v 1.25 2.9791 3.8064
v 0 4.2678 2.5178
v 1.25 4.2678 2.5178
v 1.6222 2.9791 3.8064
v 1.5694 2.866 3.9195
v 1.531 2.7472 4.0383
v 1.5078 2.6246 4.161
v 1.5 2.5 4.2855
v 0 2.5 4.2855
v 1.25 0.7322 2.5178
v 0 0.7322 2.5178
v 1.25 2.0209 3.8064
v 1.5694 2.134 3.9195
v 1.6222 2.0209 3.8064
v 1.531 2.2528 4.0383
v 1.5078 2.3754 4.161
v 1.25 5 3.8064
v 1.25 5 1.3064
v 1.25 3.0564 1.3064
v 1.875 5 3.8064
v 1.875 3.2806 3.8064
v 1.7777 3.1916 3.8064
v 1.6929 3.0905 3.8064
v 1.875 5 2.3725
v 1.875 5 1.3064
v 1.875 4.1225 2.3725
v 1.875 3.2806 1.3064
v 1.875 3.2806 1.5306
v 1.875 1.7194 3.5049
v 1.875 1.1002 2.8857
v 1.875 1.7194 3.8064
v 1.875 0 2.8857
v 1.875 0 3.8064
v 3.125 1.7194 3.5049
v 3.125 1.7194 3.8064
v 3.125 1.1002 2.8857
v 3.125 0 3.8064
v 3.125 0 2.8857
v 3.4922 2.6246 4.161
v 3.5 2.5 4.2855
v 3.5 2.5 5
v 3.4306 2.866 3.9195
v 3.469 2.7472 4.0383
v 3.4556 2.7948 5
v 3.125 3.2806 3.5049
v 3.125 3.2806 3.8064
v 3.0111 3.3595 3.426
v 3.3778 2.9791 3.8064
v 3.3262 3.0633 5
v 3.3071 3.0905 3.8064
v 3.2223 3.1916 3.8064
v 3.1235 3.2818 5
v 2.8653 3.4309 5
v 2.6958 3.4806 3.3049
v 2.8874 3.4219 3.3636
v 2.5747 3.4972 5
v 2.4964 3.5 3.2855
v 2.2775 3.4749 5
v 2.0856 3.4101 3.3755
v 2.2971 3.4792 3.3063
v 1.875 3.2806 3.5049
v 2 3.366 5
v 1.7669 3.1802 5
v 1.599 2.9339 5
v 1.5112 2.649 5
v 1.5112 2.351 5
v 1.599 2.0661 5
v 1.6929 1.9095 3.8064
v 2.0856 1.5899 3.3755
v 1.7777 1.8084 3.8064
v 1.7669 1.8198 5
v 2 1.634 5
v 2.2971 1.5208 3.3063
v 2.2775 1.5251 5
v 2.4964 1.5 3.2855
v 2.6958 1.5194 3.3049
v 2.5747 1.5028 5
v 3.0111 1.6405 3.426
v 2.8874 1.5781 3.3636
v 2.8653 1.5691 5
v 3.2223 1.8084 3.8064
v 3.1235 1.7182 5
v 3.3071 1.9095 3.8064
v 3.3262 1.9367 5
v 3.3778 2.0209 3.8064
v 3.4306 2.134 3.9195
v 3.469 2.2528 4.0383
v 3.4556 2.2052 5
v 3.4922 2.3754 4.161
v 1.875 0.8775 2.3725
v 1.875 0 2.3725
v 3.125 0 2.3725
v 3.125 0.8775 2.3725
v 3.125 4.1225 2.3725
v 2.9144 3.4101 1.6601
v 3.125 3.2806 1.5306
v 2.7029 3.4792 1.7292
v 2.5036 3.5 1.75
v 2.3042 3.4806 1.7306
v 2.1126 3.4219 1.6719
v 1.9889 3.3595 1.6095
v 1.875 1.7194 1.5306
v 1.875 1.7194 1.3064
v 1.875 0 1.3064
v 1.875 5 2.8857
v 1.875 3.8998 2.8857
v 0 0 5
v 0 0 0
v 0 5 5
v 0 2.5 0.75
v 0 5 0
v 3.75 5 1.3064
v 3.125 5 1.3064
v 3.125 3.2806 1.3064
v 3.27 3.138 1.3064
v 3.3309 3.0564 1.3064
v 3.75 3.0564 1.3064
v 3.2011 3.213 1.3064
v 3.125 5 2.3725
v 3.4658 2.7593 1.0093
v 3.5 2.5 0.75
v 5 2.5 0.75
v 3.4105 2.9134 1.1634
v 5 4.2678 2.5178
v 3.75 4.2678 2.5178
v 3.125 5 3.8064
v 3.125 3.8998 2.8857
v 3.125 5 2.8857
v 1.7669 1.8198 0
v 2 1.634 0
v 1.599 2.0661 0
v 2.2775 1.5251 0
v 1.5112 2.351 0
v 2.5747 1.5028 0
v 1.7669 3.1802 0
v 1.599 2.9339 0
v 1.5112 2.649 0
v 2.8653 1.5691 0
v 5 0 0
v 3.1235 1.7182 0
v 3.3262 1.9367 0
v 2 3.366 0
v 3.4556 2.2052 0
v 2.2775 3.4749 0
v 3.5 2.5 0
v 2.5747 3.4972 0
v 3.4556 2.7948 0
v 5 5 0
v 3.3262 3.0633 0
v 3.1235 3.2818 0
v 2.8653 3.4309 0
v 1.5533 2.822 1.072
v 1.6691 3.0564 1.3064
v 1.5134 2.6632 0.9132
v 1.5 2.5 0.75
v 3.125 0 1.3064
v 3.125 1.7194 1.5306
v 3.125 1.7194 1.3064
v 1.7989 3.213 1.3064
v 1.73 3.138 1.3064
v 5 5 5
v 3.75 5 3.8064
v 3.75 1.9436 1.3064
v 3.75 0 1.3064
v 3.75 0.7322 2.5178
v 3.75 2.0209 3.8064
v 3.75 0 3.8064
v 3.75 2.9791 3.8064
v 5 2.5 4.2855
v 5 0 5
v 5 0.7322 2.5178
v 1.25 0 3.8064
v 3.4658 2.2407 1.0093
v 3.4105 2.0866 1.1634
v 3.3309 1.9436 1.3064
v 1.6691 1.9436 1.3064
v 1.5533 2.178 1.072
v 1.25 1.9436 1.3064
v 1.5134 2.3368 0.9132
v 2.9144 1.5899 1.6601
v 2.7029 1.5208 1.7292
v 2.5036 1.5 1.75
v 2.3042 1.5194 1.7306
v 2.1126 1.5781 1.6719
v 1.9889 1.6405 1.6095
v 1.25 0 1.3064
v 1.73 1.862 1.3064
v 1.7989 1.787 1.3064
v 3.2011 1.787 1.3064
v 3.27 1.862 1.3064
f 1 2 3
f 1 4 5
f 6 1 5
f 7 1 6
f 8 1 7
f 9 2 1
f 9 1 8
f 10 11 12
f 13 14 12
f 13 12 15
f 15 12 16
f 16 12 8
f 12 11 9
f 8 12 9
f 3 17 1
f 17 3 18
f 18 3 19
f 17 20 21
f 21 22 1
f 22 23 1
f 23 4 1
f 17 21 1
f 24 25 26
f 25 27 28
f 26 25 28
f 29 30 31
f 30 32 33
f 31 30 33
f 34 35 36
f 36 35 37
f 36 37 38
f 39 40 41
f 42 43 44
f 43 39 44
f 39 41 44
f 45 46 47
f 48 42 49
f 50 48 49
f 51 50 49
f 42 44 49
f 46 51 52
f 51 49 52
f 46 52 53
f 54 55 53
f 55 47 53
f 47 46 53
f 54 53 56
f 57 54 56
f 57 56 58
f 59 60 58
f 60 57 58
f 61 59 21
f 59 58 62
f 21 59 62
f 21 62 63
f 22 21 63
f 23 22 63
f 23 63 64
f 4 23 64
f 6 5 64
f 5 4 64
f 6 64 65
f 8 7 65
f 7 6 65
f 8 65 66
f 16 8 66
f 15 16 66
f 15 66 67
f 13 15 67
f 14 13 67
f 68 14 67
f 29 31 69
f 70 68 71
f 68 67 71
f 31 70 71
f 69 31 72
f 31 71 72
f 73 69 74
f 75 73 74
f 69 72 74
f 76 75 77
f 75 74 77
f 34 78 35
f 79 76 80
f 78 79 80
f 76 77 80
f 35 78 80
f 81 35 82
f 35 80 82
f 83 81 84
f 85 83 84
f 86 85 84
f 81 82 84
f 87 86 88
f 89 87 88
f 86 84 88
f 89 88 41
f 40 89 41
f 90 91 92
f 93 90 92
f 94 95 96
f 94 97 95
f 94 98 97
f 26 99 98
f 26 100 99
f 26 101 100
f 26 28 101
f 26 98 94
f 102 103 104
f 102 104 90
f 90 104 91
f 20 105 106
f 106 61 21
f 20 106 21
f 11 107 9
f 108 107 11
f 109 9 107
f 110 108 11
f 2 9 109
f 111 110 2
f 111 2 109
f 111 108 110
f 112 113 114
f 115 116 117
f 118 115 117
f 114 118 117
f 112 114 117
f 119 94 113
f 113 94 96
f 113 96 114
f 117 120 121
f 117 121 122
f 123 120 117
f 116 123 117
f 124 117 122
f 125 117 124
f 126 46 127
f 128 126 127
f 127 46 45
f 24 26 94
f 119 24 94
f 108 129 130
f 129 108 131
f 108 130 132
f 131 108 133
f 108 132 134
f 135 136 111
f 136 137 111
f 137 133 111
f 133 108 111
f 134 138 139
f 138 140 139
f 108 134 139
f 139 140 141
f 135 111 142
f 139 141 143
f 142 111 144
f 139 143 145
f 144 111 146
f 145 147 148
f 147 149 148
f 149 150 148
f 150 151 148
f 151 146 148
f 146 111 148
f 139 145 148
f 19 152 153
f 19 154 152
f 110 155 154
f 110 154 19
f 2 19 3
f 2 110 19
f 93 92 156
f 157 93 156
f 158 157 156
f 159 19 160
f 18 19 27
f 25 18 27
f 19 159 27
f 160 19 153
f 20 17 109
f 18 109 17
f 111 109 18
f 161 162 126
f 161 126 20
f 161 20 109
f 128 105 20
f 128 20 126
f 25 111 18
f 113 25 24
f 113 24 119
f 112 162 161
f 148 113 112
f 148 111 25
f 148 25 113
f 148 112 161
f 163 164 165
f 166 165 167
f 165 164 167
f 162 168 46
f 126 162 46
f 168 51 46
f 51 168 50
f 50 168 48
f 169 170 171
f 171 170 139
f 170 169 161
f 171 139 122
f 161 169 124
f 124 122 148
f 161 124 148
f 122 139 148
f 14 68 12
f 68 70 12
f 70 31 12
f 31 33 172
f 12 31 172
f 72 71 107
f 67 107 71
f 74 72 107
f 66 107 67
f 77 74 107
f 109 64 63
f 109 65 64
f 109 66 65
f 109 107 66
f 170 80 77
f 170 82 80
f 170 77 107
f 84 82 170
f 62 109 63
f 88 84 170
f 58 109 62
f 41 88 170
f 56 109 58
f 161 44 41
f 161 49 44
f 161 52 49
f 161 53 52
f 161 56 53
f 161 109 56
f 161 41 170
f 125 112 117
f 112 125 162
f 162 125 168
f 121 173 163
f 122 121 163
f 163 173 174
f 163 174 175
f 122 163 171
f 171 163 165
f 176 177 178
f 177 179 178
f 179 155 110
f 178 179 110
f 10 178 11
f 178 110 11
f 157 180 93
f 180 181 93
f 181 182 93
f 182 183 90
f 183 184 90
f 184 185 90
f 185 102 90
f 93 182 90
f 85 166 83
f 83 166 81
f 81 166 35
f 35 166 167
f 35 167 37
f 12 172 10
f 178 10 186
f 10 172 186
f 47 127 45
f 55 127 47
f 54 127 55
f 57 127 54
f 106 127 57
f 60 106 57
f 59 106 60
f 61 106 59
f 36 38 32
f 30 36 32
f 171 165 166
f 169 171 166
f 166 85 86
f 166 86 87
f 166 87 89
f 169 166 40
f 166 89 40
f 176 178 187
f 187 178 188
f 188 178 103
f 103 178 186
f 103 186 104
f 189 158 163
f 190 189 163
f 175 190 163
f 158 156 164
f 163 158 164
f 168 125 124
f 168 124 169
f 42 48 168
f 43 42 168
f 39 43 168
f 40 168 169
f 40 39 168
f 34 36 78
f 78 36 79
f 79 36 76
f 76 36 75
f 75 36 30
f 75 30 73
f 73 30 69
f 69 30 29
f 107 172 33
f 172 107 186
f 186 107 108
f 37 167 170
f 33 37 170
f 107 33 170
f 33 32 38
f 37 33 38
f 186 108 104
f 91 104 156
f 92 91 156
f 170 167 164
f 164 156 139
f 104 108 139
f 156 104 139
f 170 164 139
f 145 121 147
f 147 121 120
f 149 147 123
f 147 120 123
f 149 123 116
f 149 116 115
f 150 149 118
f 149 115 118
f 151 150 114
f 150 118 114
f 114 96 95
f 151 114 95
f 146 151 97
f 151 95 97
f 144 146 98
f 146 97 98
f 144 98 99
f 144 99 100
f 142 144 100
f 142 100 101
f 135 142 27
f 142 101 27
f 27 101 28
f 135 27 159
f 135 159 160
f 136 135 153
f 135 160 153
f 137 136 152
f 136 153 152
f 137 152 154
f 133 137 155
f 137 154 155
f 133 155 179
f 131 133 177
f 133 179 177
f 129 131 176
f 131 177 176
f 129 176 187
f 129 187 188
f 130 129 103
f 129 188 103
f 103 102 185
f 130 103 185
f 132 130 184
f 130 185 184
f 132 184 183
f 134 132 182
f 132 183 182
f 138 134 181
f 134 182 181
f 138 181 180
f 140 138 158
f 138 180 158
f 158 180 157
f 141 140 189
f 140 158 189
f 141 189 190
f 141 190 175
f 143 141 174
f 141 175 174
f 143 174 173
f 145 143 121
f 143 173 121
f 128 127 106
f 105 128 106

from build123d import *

# Parameters (mm, degrees)
BOX_W           = 5
BOX_H           = 5
BOX_DEPTH       = 5
SKETCH_R        = 1
POCKET_DEPTH    = 7.5
POCKET001_DEPTH = 5
BOX001_W        = 2.5
BOX001_H        = 2.5
BOX001_DEPTH    = 5


with BuildPart() as part:
    # Box → Box (join)
    with BuildSketch(Plane.XY):
        with Locations((2.5, 2.5)):
            Rectangle(BOX_W, BOX_H)
    extrude(amount=BOX_DEPTH)

    # Sketch → Pocket (cut, symmetric)
    with BuildSketch(Plane.XY):
        with Locations((2.5, 2.5)):
            Circle(SKETCH_R)
    extrude(amount=POCKET_DEPTH, both=True, mode=Mode.SUBTRACT)

    # Sketch001 → Pocket001 (cut)
    with BuildSketch(Plane.XZ):
        Polygon((1.25, 3.806445), (1.25, 1.306445), (1.875, 1.306445), (1.875, 2.372529), (3.125, 2.372529), (3.125, 1.306445), (3.75, 1.306445), (3.75, 3.806445), (3.125, 3.806445), (3.125, 2.885704), (1.875, 2.885704), (1.875, 3.806445), align=None)
    extrude(amount=-POCKET001_DEPTH, mode=Mode.SUBTRACT)

    # Box001 → Box001 (cut)
    with BuildSketch(Plane(origin=(0, 2.5, 0.75), x_dir=(0, 0.707107, 0.707107), z_dir=(1, 0, 0))):
        with Locations((1.25, 1.25)):
            Rectangle(BOX001_W, BOX001_H)
    extrude(amount=BOX001_DEPTH, mode=Mode.SUBTRACT)


solid = part.part
